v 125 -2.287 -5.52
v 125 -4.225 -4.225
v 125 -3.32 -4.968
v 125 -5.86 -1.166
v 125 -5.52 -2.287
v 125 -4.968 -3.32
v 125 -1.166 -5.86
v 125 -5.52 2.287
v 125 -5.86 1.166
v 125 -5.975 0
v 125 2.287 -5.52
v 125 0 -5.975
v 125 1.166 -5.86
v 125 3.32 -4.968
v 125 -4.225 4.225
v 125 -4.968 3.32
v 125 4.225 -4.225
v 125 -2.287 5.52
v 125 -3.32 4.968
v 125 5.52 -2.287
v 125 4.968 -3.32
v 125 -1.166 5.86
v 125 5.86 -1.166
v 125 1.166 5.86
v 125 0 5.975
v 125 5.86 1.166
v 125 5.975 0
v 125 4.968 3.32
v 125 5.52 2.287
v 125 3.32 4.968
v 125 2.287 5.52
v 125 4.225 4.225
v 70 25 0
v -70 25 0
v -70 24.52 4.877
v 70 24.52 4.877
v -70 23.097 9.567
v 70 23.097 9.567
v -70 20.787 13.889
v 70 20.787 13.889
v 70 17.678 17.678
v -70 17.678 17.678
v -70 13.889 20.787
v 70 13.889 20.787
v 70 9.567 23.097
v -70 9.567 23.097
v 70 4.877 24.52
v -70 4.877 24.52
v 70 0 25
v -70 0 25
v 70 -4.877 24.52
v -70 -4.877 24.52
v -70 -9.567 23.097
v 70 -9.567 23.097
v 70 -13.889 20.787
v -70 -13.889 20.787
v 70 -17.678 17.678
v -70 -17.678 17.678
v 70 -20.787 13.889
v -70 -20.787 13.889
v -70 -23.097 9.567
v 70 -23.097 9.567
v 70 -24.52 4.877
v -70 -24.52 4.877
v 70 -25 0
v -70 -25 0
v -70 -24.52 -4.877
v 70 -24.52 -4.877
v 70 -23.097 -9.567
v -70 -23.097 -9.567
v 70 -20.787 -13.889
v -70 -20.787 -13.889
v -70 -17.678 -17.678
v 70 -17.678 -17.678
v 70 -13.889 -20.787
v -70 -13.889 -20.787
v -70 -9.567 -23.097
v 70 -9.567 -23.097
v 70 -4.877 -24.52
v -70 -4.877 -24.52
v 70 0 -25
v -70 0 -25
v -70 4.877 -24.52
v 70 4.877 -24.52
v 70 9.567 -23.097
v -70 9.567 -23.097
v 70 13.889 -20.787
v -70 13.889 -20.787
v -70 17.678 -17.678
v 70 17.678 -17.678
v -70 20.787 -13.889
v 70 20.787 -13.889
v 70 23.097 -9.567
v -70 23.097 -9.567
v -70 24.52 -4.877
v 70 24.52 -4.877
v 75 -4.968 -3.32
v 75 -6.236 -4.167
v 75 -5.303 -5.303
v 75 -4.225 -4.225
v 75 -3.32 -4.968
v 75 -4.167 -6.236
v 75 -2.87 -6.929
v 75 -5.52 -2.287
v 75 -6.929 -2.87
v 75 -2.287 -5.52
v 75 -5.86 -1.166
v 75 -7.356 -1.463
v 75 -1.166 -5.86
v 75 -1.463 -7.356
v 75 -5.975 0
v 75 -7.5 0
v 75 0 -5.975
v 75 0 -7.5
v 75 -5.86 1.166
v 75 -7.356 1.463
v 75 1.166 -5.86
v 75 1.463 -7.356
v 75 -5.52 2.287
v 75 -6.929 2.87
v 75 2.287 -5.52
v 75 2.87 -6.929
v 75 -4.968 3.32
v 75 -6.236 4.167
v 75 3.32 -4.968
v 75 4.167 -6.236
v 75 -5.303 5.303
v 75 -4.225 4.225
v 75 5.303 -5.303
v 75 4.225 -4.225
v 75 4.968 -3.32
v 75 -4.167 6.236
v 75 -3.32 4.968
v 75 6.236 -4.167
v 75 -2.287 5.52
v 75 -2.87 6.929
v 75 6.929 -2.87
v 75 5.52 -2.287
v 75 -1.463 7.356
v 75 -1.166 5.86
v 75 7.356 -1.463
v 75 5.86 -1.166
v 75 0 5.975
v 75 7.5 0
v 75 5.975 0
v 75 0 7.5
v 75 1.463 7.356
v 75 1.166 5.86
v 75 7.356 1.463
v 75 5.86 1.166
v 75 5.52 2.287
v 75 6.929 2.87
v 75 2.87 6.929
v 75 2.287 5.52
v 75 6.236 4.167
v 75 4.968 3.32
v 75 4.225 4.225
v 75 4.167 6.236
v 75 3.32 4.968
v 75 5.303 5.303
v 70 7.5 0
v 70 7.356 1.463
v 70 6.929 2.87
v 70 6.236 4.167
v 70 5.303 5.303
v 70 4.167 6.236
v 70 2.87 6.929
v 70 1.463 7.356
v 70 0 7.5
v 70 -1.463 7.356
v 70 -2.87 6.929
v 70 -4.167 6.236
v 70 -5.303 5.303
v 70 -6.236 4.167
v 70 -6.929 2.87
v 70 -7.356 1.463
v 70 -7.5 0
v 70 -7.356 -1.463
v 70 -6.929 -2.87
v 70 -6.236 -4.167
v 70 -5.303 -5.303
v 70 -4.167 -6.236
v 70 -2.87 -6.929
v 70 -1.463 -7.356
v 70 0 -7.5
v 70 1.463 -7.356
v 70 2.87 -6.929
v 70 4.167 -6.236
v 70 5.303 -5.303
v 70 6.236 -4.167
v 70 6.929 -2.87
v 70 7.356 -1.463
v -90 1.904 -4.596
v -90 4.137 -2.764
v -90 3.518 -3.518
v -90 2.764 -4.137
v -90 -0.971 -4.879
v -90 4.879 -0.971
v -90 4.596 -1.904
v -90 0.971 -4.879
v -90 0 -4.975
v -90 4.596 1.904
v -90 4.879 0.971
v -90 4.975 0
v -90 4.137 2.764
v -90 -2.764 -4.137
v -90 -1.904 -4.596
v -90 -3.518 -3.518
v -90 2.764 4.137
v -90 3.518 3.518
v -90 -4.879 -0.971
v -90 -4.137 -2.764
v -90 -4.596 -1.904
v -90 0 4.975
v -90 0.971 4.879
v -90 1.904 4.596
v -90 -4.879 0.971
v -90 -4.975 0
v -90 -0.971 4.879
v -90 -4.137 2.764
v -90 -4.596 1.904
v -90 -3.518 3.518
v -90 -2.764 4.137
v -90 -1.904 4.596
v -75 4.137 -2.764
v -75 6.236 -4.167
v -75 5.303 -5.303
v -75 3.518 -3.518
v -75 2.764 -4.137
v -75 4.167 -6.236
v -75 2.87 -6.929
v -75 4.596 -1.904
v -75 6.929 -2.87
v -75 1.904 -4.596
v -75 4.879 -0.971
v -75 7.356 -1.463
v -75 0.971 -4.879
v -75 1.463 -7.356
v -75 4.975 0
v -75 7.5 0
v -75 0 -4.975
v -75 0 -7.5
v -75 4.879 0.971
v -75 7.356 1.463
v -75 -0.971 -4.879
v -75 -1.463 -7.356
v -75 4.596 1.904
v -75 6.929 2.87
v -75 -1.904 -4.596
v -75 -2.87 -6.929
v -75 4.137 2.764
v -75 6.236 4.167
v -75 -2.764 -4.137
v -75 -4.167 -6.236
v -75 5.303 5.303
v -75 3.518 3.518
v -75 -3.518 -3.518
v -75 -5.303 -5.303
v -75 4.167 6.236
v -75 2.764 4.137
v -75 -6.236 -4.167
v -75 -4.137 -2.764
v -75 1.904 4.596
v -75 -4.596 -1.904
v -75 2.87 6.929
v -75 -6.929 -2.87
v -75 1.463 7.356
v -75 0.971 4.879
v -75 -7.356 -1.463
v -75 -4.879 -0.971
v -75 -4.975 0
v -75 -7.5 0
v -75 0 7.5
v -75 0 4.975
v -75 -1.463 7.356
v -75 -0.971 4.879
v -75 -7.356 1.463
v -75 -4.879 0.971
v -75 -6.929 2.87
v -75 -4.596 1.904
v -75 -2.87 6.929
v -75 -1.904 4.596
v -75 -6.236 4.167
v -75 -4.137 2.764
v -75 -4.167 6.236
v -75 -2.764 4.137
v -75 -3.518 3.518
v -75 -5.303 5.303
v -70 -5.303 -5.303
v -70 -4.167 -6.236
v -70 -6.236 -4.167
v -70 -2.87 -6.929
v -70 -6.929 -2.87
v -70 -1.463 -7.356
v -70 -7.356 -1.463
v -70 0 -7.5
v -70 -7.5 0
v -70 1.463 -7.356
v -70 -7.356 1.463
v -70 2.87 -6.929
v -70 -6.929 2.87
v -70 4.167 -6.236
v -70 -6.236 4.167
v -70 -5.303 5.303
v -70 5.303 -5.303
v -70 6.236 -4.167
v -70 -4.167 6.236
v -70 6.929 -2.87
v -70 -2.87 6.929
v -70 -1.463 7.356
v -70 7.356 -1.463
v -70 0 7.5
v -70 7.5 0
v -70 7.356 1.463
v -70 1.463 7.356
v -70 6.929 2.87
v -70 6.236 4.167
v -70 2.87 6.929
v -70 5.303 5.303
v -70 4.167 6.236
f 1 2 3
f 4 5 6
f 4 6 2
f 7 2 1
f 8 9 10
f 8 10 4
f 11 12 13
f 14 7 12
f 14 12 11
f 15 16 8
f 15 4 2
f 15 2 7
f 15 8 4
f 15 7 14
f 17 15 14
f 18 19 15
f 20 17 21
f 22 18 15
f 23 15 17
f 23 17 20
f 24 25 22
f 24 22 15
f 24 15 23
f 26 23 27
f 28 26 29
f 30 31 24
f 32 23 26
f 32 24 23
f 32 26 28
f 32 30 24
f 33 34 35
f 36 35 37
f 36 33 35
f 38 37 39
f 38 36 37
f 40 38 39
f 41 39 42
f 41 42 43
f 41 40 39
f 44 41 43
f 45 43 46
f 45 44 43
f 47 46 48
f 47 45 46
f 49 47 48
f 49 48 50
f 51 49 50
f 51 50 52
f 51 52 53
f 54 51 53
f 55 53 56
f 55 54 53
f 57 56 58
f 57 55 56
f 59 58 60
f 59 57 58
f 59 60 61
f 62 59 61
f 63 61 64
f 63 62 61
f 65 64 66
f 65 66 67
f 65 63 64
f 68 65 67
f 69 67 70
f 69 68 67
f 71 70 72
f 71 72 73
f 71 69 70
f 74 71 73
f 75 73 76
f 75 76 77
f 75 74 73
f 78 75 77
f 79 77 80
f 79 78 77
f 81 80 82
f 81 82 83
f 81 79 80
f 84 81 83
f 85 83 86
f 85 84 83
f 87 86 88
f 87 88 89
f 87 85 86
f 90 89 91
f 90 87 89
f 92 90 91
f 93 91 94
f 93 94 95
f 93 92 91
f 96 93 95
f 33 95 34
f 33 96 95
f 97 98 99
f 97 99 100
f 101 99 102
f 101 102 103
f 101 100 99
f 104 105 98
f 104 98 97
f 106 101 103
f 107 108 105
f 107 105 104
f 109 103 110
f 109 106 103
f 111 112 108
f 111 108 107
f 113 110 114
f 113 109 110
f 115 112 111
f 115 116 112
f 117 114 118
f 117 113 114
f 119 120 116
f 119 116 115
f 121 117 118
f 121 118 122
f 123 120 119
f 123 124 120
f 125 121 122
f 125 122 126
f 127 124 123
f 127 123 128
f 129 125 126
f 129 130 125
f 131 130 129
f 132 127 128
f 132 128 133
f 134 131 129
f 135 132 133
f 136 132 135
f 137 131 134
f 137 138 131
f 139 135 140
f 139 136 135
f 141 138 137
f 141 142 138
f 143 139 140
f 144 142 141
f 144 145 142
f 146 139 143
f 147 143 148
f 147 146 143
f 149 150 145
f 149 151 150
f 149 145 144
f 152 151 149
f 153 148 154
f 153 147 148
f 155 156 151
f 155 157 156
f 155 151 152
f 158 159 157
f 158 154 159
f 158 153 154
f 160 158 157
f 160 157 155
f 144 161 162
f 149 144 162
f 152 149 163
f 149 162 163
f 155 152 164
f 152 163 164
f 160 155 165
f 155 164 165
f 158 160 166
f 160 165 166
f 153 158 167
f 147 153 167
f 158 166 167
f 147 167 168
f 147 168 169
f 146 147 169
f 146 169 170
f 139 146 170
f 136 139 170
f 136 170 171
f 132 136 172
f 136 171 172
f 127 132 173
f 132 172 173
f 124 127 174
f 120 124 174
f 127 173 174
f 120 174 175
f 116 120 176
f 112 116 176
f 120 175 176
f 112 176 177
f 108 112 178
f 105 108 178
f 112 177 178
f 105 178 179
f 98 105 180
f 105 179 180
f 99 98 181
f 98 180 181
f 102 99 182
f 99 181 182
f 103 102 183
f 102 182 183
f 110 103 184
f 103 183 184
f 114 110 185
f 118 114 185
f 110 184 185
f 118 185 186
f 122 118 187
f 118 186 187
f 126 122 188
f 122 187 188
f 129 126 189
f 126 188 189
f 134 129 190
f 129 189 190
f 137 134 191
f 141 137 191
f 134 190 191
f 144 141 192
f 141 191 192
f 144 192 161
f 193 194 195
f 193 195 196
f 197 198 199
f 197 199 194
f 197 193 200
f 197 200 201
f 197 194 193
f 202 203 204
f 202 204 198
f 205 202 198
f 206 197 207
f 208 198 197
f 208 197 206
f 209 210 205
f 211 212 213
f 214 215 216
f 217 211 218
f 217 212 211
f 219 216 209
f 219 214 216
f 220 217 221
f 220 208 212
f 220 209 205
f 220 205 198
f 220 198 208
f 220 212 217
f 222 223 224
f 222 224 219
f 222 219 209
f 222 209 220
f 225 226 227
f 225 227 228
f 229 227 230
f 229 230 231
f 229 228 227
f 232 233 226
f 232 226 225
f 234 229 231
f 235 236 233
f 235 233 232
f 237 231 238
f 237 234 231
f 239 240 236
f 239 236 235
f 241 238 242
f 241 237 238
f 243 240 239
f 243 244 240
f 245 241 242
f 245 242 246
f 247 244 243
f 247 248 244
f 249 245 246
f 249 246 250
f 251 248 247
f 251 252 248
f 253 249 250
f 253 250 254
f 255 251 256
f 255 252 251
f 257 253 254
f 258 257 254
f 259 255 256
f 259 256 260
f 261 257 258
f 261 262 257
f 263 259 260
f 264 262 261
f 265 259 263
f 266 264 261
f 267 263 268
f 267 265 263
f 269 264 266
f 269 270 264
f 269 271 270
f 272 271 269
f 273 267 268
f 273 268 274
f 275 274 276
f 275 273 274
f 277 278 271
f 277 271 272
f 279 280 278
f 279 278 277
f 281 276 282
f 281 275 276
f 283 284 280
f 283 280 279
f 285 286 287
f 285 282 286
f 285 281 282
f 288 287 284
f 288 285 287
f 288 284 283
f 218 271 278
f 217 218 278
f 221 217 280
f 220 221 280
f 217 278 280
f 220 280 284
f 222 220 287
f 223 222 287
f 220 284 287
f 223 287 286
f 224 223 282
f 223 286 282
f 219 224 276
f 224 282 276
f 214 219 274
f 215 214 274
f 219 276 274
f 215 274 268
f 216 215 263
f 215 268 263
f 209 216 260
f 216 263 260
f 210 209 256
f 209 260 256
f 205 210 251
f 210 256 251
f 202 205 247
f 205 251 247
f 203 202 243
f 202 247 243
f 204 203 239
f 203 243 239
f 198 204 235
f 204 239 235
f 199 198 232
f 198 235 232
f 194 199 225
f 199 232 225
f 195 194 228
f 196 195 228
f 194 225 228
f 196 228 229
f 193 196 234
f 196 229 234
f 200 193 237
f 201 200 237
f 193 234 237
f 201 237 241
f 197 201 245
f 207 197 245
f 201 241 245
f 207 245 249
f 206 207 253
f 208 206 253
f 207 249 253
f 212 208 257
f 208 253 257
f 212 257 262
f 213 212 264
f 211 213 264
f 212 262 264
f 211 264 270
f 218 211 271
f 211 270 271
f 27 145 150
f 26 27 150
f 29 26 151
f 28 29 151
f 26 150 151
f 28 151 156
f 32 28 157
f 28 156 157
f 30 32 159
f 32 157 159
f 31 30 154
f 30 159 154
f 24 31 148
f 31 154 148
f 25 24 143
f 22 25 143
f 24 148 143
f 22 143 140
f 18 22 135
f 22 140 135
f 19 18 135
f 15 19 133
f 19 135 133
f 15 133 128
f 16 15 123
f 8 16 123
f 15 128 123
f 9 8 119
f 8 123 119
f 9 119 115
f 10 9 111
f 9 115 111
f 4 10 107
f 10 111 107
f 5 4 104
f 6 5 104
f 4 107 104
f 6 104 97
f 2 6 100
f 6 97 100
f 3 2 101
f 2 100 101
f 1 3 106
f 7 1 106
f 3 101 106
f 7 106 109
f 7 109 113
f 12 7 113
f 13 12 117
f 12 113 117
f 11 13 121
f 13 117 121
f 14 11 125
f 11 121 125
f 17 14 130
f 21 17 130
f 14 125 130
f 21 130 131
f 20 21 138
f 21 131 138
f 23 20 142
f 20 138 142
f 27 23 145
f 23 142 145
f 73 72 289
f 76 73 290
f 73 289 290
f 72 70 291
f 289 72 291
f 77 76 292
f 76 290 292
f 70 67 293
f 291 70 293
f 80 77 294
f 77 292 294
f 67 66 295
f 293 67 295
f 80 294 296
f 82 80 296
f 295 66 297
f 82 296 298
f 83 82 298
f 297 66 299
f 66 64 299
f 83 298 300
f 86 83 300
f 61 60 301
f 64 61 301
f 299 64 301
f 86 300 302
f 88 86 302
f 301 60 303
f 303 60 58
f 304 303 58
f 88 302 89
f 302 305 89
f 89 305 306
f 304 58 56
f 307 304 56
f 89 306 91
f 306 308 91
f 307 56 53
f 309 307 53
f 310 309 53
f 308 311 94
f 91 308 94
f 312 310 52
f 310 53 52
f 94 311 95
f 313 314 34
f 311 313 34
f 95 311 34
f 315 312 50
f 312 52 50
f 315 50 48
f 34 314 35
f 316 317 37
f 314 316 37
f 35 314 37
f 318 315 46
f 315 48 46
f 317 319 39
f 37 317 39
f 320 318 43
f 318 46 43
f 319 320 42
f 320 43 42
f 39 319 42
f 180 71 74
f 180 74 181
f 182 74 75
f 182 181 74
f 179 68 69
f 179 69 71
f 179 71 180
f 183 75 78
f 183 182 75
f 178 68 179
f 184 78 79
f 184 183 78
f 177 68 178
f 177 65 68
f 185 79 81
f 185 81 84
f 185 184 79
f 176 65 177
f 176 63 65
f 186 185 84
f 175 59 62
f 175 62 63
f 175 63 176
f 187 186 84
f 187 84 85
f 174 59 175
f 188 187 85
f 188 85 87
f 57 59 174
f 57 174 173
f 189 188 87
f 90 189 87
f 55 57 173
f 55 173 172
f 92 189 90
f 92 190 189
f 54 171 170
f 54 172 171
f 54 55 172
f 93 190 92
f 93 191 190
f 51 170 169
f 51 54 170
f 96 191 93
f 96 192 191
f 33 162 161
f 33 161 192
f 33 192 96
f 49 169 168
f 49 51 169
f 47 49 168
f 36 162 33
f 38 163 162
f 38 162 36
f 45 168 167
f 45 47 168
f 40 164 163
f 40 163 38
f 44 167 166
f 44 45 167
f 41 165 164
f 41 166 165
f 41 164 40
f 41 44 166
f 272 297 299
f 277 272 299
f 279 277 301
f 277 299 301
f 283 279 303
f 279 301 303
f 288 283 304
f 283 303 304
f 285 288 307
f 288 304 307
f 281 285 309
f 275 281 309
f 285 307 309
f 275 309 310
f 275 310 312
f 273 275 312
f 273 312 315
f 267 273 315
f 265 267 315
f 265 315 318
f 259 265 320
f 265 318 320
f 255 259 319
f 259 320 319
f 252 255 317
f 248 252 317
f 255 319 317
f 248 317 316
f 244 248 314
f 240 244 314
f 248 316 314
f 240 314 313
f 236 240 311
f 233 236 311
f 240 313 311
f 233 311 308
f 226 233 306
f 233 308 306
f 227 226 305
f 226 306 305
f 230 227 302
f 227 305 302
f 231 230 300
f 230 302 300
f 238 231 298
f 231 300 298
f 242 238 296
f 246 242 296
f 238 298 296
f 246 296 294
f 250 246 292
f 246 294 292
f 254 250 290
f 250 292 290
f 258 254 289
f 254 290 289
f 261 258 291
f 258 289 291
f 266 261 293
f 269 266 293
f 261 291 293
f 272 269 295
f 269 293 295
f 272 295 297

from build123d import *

# Parameters (mm, degrees)
F0_R      = 25
F1_DEPTH  = 70
F2_R      = 7.5
F3_DEPTH  = 5
F4_R      = 5.975
F5_DEPTH  = 50
F6_DEPTH  = 70
F7_R      = 7.5
F8_DEPTH  = 5
F9_R      = 4.975
F10_DEPTH = 15


with BuildPart() as f1:
    # F0 (on Right) → F1 (new body)
    with BuildSketch(Plane.YZ):
        Circle(F0_R)
    extrude(amount=F1_DEPTH)

    # F2 (on face) → F3 (join)
    with BuildSketch(Plane.YZ.offset(70)):
        Circle(F2_R)
    extrude(amount=F3_DEPTH)

    # F4 (on face) → F5 (join)
    with BuildSketch(Plane.YZ.offset(75)):
        Circle(F4_R)
    extrude(amount=F5_DEPTH)

    # F6 (add): a face of the model
    f6_faces = [f1.faces().sort_by_distance(p)[0] for p in [
        (0, 0, 0),
    ]]
    extrude(f6_faces, amount=F6_DEPTH)

    # F7 (on face) → F8 (join)
    with BuildSketch(Plane(origin=(-70, 0, 0), x_dir=(0, -1, 0), z_dir=(-1, 0, 0))):
        Circle(F7_R)
    extrude(amount=F8_DEPTH)

    # F9 (on face) → F10 (join)
    with BuildSketch(Plane(origin=(-75, 0, 0), x_dir=(0, -1, 0), z_dir=(-1, 0, 0))):
        Circle(F9_R)
    extrude(amount=F10_DEPTH)


solid = f1.part
